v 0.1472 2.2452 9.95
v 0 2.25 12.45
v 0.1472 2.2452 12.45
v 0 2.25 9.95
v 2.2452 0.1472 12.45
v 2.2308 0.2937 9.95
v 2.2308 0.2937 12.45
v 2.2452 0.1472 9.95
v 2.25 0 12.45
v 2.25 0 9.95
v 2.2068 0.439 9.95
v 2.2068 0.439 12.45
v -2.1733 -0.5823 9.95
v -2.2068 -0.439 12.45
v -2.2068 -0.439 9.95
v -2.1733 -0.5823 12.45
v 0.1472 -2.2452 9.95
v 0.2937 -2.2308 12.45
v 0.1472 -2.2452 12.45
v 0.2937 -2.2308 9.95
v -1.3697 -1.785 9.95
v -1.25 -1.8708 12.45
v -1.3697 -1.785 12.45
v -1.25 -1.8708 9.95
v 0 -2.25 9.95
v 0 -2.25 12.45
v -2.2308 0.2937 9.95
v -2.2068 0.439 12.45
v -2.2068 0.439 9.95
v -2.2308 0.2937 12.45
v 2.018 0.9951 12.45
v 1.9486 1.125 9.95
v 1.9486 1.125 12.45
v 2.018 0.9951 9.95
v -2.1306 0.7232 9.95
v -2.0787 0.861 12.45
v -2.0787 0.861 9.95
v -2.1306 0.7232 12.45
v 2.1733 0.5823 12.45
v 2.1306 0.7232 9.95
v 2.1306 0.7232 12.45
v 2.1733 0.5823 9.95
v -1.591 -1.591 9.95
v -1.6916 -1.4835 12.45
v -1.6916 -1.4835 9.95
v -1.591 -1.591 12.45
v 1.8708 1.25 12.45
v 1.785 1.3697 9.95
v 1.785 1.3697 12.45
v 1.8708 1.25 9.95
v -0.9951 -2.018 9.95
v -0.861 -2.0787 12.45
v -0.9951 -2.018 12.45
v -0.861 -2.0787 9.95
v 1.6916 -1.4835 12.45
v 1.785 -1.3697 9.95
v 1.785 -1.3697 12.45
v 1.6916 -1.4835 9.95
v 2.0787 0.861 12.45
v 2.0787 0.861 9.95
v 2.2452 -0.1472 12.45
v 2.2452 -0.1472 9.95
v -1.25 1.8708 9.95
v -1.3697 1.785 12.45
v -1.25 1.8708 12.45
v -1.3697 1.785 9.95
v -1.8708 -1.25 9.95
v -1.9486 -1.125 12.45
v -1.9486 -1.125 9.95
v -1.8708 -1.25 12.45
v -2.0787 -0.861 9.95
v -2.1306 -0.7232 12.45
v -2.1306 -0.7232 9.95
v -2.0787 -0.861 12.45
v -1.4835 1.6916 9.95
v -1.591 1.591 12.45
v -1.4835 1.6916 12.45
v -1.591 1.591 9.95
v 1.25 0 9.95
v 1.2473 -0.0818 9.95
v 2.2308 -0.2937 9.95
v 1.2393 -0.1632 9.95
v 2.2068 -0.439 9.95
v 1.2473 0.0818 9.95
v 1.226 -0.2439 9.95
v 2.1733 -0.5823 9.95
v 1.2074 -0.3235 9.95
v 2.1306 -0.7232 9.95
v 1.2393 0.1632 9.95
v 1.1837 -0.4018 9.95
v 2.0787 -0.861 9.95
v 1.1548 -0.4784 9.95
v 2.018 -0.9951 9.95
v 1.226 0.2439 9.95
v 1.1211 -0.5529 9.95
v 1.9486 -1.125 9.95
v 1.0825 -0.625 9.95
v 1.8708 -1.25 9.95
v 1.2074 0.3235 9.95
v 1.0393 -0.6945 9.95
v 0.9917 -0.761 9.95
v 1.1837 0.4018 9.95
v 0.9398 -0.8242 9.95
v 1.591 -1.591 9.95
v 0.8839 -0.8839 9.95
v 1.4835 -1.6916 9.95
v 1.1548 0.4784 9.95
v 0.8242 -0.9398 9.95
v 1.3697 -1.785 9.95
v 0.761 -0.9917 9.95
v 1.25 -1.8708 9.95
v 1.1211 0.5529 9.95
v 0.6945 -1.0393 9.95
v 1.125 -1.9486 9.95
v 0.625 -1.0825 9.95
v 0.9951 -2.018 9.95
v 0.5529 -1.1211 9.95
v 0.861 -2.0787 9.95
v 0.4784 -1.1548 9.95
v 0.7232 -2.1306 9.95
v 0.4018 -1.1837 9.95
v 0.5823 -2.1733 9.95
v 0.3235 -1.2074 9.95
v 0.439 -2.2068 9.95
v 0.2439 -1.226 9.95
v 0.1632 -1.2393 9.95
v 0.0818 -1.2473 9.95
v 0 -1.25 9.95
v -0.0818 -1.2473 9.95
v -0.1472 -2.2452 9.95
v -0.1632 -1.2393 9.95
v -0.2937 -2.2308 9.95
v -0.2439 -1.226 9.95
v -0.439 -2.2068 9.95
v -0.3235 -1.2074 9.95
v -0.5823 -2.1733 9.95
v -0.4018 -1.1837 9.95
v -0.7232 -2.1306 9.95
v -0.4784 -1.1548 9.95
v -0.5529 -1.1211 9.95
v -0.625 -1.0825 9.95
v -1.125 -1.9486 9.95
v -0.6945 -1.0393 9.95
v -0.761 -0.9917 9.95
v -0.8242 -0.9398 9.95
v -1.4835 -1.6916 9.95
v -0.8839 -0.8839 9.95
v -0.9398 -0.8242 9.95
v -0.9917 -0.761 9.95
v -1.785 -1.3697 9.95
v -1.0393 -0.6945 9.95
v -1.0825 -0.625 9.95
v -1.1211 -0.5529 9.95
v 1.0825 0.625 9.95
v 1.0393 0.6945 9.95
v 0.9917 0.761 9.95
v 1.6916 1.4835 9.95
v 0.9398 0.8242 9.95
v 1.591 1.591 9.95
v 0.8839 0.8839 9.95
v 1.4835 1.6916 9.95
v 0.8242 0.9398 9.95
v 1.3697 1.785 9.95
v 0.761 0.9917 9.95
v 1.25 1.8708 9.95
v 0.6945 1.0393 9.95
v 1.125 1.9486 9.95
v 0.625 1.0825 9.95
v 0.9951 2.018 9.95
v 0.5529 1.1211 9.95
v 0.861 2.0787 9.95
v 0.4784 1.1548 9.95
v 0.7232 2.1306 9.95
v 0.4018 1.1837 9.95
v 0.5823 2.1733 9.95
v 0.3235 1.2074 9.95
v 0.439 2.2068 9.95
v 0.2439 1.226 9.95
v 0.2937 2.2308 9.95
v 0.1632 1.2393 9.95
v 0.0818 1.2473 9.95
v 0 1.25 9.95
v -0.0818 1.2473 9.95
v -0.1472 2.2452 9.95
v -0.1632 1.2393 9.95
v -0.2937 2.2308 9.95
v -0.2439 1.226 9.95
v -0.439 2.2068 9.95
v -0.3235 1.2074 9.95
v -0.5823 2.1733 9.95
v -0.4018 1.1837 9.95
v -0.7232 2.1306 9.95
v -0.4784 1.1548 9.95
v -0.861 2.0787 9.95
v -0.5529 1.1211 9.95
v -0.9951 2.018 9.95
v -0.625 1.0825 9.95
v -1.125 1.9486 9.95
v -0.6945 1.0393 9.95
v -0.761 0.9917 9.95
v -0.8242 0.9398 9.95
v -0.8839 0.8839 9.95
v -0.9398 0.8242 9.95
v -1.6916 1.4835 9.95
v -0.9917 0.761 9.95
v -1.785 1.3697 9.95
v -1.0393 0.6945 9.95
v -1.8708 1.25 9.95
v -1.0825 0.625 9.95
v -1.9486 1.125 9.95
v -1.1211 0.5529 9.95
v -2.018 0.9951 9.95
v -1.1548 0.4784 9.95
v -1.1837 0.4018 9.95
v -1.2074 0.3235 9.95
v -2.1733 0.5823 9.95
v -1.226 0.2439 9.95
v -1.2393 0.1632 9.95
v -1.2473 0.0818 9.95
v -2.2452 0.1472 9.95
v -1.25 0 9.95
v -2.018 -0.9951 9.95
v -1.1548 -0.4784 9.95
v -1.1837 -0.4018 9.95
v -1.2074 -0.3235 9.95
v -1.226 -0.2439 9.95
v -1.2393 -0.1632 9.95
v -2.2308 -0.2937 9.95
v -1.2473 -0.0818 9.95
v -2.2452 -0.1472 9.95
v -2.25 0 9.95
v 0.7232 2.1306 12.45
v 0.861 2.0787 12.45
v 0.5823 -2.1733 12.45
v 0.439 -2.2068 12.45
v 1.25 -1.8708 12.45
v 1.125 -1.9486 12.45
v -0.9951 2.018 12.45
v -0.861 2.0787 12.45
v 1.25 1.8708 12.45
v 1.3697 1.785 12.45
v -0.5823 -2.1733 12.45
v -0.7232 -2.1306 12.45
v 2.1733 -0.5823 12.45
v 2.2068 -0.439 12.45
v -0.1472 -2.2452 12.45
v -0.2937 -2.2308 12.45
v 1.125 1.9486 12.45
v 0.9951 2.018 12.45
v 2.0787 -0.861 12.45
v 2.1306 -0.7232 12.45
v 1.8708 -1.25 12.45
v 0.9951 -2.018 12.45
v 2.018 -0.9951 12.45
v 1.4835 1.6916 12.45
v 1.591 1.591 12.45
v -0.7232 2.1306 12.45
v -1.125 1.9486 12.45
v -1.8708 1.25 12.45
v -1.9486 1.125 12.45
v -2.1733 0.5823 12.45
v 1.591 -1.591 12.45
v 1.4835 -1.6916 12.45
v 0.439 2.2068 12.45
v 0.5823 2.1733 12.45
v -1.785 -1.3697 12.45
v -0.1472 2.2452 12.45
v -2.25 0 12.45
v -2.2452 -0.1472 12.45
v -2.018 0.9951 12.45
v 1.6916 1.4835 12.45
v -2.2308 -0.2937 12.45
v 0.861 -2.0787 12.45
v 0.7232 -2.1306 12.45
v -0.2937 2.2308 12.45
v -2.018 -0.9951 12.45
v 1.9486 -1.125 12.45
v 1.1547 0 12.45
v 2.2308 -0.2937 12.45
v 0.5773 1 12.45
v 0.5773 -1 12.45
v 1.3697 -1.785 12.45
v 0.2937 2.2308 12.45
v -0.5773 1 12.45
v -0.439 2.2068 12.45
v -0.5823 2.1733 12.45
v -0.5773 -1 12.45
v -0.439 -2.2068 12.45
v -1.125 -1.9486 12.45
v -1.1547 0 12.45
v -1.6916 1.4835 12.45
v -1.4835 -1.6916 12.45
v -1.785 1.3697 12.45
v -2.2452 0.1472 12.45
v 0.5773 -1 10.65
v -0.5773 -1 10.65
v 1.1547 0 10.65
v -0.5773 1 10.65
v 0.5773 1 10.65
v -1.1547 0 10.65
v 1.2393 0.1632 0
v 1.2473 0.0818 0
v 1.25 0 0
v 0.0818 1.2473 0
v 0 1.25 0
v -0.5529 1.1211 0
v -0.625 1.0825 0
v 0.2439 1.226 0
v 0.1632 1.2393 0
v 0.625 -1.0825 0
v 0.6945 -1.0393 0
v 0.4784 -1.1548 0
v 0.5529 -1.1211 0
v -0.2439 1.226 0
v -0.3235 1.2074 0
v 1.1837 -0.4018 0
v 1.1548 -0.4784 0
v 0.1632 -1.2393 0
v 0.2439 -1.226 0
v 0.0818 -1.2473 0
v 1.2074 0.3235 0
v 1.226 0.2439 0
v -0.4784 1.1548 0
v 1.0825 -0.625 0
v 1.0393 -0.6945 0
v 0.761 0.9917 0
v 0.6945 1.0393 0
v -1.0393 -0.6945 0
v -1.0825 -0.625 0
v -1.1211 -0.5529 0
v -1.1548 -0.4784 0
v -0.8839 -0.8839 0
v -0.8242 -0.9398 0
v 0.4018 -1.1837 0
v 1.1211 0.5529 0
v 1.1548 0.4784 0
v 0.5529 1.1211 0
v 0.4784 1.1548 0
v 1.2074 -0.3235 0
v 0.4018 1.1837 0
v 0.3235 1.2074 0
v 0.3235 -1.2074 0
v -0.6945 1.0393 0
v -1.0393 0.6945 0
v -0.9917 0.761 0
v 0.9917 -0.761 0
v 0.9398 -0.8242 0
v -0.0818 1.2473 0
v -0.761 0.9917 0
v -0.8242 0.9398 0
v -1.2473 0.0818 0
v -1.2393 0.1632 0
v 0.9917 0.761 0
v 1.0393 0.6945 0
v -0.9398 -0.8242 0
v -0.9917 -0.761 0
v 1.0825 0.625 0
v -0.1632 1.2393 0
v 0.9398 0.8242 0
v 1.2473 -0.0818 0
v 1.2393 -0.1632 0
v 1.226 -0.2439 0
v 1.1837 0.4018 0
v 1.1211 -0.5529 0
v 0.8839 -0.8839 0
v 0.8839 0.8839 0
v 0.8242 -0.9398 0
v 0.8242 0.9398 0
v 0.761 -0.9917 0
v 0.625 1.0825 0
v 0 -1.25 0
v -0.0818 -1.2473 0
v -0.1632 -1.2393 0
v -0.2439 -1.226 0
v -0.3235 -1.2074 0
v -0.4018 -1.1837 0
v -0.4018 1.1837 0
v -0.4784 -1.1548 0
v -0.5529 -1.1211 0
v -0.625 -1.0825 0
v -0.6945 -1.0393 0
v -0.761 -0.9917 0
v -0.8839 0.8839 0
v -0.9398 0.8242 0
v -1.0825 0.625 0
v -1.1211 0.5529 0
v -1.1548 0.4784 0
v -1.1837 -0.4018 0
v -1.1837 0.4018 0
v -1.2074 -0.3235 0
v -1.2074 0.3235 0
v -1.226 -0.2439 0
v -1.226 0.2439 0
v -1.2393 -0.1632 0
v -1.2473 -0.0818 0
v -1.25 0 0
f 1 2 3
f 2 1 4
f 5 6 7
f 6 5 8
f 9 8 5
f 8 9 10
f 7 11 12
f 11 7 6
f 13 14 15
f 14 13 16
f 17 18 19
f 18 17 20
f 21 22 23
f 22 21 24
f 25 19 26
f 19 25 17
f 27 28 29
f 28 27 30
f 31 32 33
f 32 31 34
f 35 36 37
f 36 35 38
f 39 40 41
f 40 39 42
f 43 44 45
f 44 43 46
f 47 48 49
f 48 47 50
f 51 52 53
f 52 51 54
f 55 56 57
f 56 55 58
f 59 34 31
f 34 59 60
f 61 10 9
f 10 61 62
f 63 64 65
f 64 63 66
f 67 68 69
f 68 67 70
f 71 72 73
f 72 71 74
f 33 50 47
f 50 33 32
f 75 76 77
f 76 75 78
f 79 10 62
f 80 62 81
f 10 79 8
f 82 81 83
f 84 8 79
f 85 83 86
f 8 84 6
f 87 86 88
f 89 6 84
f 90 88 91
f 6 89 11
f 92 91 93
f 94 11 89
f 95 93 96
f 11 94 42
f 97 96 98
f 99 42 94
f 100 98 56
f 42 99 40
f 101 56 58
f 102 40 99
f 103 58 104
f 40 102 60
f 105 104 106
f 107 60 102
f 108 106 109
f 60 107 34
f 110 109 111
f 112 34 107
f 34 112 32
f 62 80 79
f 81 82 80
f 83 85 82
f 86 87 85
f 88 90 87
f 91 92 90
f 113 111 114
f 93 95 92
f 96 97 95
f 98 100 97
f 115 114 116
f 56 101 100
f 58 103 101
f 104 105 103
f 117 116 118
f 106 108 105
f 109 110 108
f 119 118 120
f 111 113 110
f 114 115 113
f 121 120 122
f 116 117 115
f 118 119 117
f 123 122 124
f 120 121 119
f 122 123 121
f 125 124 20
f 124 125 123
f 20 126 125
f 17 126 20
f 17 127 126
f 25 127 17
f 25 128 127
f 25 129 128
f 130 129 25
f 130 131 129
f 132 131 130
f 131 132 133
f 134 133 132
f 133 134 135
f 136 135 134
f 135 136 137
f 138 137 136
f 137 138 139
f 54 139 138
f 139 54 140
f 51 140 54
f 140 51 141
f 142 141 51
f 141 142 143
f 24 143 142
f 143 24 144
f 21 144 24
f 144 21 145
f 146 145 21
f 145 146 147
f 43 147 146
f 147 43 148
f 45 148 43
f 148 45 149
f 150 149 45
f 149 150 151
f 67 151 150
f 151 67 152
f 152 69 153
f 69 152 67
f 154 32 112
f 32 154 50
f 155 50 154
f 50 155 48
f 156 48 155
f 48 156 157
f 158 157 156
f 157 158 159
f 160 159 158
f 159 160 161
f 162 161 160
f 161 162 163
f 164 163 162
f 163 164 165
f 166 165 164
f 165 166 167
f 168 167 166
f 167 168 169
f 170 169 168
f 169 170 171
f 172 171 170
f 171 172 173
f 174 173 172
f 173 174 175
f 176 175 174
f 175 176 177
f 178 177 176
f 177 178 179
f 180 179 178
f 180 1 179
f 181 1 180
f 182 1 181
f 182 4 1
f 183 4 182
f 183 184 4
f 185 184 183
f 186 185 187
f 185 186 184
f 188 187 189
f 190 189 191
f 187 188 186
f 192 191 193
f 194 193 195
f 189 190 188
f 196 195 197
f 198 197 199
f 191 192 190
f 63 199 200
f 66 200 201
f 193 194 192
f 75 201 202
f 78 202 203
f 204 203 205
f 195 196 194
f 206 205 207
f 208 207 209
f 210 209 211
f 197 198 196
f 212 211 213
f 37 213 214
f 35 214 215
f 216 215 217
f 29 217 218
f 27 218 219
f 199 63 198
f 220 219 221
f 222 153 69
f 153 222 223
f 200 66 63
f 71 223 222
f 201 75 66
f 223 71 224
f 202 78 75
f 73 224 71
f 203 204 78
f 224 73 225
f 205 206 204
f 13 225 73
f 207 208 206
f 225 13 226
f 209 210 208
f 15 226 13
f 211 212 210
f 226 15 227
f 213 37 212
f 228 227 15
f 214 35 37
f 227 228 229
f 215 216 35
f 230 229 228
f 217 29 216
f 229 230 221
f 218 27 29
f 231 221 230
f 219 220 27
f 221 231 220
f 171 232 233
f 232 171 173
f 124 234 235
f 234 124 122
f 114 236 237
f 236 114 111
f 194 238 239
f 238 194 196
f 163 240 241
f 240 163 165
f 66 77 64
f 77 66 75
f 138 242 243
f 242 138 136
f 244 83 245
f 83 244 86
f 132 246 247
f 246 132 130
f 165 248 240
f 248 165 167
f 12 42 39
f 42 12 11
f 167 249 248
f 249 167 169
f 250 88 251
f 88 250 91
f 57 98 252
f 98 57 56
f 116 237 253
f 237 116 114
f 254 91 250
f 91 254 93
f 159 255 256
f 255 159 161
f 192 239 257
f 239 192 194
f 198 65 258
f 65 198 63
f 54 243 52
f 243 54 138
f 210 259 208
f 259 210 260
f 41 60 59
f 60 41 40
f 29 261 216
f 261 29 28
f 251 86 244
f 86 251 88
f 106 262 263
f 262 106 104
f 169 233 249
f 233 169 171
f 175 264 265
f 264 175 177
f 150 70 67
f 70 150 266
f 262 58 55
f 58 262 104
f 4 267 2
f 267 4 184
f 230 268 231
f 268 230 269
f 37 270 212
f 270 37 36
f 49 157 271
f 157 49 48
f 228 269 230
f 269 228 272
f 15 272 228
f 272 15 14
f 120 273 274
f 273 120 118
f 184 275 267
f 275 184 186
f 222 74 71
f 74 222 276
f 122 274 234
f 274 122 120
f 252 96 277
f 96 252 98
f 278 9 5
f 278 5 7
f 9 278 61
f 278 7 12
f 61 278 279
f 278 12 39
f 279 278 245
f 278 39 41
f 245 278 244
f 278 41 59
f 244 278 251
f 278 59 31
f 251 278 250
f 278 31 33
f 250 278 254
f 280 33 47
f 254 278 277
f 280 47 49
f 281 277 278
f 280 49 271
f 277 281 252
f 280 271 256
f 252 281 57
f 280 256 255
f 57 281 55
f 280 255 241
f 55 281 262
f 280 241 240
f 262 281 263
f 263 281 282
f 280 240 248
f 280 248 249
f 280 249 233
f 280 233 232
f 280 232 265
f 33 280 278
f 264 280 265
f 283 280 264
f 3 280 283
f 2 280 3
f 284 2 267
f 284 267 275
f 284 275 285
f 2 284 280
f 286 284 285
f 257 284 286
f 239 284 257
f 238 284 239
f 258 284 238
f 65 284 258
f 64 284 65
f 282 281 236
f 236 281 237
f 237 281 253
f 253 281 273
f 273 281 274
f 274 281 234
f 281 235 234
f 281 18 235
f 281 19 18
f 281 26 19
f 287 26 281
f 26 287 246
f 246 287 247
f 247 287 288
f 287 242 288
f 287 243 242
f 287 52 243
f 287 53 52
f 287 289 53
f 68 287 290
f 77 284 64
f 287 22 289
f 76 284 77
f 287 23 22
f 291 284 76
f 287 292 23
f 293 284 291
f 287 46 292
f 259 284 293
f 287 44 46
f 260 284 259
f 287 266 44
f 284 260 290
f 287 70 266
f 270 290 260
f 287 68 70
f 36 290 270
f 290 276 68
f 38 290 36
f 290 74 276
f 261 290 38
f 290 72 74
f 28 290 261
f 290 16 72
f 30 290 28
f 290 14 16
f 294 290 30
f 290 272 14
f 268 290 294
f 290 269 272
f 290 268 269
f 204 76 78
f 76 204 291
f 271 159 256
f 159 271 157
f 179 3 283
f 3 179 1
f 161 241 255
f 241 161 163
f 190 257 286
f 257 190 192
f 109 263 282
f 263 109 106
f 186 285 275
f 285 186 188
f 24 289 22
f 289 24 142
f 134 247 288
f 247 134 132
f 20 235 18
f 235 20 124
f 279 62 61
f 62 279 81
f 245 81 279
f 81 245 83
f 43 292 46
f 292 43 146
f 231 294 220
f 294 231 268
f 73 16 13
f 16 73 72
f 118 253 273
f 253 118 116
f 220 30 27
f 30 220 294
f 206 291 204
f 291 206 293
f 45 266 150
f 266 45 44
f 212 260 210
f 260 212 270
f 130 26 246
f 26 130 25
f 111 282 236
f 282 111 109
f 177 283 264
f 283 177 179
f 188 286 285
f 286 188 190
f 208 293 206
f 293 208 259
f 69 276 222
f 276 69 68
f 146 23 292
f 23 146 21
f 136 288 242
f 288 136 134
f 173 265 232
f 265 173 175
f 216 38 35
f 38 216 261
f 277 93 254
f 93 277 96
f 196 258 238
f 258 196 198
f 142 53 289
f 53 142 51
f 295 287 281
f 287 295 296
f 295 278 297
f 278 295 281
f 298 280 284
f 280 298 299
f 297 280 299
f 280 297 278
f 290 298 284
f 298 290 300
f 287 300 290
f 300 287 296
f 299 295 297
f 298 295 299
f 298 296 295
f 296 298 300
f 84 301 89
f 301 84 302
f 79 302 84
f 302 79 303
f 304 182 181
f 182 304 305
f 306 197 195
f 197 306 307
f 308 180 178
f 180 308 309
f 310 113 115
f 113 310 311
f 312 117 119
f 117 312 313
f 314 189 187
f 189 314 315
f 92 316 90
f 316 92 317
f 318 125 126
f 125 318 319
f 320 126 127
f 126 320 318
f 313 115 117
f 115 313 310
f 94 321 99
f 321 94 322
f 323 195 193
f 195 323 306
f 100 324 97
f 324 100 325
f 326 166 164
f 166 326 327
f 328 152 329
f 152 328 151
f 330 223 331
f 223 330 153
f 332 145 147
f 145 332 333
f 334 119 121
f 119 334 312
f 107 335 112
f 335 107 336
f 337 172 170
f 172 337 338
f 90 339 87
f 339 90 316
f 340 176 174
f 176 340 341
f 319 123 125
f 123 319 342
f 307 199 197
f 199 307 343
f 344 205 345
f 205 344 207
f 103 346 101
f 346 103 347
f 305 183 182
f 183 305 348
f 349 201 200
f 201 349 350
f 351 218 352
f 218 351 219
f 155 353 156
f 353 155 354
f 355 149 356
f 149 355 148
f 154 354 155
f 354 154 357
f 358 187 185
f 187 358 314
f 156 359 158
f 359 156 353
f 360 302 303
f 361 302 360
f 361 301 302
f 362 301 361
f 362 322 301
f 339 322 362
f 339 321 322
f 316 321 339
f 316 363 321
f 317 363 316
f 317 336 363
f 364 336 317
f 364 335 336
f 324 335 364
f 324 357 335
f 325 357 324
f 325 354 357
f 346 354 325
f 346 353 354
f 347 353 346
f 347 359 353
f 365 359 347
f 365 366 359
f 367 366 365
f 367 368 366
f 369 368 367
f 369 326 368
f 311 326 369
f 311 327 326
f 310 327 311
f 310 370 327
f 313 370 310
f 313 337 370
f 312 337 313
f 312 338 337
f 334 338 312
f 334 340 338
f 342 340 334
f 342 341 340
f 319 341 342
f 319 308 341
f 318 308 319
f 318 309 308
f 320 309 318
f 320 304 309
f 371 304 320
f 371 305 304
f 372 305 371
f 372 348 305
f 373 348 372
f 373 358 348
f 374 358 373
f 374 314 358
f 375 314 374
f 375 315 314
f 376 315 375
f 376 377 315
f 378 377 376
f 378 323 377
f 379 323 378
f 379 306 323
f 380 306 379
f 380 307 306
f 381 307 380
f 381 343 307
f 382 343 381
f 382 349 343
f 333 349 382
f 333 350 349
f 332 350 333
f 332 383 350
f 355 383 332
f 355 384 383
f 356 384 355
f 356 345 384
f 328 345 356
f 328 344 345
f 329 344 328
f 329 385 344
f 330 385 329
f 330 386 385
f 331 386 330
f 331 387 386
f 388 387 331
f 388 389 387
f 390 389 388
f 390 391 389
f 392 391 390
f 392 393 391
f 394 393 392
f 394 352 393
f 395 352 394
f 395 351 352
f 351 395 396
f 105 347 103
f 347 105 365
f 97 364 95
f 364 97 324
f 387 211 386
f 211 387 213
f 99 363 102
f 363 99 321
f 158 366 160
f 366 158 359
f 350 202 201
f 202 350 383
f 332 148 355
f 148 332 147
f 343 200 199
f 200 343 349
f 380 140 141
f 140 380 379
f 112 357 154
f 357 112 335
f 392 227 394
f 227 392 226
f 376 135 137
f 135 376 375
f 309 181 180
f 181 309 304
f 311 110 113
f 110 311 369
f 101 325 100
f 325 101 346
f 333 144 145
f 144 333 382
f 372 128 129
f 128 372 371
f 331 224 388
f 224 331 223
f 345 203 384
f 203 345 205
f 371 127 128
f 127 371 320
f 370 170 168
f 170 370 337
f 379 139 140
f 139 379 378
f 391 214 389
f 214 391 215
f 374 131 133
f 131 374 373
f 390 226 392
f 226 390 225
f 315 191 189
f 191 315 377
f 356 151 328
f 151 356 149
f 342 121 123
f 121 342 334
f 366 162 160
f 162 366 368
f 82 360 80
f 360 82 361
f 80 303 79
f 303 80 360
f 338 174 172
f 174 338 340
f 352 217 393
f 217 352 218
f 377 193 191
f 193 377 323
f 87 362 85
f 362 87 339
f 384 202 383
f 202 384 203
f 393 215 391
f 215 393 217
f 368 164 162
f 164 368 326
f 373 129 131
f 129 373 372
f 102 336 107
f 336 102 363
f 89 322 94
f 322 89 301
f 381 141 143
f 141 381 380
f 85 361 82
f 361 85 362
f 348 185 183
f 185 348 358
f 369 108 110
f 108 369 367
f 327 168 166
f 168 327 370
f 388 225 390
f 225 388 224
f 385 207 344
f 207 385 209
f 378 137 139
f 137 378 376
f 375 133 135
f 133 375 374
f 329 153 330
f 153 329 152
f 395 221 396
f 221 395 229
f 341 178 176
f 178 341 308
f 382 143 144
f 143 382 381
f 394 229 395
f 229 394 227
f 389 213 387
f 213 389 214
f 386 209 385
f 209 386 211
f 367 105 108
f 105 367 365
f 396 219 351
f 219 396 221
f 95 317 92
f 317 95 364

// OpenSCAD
// Socket head cap screw (M2.5-ish) per requested dimensions
// Shank: 2.5mm dia, 10mm long
// Head: 4.5mm dia, 2.5mm tall
// Hex socket: 2mm across flats (approx), recessed from top

$fn = 96;

// Parameters
shank_diameter   = 2.5;
shank_length     = 10;

head_diameter    = 4.5;
head_height      = 2.5;

hex_af           = 2.0;   // across flats
socket_depth     = 1.6;   // typical recess depth (kept within head height)
socket_top_margin= 0.2;   // material above socket
overlap          = 0.05;  // small overlap to ensure watertight union/difference

// Hex prism sized by across-flats (AF)
module hex_prism_af(af, h) {
    // For a regular hexagon: AF = 2 * apothem; circumradius R = AF / sqrt(3)
    R = af / sqrt(3);
    cylinder(h=h, r=R, $fn=6);
}

module shank() {
    cylinder(d=shank_diameter, h=shank_length, center=false);
}

module head() {
    difference() {
        cylinder(d=head_diameter, h=head_height, center=false);

        // Cut socket from the top down
        // Place so the top of the cut is slightly above the head to guarantee a clean opening
        translate([0, 0, head_height - socket_top_margin - socket_depth])
            hex_prism_af(hex_af, socket_depth + socket_top_margin + overlap);
    }
}

module screw() {
    union() {
        shank();
        // Head sits on top of shank with slight overlap to ensure one connected solid
        translate([0, 0, shank_length - overlap])
            head();
    }
}

screw();
